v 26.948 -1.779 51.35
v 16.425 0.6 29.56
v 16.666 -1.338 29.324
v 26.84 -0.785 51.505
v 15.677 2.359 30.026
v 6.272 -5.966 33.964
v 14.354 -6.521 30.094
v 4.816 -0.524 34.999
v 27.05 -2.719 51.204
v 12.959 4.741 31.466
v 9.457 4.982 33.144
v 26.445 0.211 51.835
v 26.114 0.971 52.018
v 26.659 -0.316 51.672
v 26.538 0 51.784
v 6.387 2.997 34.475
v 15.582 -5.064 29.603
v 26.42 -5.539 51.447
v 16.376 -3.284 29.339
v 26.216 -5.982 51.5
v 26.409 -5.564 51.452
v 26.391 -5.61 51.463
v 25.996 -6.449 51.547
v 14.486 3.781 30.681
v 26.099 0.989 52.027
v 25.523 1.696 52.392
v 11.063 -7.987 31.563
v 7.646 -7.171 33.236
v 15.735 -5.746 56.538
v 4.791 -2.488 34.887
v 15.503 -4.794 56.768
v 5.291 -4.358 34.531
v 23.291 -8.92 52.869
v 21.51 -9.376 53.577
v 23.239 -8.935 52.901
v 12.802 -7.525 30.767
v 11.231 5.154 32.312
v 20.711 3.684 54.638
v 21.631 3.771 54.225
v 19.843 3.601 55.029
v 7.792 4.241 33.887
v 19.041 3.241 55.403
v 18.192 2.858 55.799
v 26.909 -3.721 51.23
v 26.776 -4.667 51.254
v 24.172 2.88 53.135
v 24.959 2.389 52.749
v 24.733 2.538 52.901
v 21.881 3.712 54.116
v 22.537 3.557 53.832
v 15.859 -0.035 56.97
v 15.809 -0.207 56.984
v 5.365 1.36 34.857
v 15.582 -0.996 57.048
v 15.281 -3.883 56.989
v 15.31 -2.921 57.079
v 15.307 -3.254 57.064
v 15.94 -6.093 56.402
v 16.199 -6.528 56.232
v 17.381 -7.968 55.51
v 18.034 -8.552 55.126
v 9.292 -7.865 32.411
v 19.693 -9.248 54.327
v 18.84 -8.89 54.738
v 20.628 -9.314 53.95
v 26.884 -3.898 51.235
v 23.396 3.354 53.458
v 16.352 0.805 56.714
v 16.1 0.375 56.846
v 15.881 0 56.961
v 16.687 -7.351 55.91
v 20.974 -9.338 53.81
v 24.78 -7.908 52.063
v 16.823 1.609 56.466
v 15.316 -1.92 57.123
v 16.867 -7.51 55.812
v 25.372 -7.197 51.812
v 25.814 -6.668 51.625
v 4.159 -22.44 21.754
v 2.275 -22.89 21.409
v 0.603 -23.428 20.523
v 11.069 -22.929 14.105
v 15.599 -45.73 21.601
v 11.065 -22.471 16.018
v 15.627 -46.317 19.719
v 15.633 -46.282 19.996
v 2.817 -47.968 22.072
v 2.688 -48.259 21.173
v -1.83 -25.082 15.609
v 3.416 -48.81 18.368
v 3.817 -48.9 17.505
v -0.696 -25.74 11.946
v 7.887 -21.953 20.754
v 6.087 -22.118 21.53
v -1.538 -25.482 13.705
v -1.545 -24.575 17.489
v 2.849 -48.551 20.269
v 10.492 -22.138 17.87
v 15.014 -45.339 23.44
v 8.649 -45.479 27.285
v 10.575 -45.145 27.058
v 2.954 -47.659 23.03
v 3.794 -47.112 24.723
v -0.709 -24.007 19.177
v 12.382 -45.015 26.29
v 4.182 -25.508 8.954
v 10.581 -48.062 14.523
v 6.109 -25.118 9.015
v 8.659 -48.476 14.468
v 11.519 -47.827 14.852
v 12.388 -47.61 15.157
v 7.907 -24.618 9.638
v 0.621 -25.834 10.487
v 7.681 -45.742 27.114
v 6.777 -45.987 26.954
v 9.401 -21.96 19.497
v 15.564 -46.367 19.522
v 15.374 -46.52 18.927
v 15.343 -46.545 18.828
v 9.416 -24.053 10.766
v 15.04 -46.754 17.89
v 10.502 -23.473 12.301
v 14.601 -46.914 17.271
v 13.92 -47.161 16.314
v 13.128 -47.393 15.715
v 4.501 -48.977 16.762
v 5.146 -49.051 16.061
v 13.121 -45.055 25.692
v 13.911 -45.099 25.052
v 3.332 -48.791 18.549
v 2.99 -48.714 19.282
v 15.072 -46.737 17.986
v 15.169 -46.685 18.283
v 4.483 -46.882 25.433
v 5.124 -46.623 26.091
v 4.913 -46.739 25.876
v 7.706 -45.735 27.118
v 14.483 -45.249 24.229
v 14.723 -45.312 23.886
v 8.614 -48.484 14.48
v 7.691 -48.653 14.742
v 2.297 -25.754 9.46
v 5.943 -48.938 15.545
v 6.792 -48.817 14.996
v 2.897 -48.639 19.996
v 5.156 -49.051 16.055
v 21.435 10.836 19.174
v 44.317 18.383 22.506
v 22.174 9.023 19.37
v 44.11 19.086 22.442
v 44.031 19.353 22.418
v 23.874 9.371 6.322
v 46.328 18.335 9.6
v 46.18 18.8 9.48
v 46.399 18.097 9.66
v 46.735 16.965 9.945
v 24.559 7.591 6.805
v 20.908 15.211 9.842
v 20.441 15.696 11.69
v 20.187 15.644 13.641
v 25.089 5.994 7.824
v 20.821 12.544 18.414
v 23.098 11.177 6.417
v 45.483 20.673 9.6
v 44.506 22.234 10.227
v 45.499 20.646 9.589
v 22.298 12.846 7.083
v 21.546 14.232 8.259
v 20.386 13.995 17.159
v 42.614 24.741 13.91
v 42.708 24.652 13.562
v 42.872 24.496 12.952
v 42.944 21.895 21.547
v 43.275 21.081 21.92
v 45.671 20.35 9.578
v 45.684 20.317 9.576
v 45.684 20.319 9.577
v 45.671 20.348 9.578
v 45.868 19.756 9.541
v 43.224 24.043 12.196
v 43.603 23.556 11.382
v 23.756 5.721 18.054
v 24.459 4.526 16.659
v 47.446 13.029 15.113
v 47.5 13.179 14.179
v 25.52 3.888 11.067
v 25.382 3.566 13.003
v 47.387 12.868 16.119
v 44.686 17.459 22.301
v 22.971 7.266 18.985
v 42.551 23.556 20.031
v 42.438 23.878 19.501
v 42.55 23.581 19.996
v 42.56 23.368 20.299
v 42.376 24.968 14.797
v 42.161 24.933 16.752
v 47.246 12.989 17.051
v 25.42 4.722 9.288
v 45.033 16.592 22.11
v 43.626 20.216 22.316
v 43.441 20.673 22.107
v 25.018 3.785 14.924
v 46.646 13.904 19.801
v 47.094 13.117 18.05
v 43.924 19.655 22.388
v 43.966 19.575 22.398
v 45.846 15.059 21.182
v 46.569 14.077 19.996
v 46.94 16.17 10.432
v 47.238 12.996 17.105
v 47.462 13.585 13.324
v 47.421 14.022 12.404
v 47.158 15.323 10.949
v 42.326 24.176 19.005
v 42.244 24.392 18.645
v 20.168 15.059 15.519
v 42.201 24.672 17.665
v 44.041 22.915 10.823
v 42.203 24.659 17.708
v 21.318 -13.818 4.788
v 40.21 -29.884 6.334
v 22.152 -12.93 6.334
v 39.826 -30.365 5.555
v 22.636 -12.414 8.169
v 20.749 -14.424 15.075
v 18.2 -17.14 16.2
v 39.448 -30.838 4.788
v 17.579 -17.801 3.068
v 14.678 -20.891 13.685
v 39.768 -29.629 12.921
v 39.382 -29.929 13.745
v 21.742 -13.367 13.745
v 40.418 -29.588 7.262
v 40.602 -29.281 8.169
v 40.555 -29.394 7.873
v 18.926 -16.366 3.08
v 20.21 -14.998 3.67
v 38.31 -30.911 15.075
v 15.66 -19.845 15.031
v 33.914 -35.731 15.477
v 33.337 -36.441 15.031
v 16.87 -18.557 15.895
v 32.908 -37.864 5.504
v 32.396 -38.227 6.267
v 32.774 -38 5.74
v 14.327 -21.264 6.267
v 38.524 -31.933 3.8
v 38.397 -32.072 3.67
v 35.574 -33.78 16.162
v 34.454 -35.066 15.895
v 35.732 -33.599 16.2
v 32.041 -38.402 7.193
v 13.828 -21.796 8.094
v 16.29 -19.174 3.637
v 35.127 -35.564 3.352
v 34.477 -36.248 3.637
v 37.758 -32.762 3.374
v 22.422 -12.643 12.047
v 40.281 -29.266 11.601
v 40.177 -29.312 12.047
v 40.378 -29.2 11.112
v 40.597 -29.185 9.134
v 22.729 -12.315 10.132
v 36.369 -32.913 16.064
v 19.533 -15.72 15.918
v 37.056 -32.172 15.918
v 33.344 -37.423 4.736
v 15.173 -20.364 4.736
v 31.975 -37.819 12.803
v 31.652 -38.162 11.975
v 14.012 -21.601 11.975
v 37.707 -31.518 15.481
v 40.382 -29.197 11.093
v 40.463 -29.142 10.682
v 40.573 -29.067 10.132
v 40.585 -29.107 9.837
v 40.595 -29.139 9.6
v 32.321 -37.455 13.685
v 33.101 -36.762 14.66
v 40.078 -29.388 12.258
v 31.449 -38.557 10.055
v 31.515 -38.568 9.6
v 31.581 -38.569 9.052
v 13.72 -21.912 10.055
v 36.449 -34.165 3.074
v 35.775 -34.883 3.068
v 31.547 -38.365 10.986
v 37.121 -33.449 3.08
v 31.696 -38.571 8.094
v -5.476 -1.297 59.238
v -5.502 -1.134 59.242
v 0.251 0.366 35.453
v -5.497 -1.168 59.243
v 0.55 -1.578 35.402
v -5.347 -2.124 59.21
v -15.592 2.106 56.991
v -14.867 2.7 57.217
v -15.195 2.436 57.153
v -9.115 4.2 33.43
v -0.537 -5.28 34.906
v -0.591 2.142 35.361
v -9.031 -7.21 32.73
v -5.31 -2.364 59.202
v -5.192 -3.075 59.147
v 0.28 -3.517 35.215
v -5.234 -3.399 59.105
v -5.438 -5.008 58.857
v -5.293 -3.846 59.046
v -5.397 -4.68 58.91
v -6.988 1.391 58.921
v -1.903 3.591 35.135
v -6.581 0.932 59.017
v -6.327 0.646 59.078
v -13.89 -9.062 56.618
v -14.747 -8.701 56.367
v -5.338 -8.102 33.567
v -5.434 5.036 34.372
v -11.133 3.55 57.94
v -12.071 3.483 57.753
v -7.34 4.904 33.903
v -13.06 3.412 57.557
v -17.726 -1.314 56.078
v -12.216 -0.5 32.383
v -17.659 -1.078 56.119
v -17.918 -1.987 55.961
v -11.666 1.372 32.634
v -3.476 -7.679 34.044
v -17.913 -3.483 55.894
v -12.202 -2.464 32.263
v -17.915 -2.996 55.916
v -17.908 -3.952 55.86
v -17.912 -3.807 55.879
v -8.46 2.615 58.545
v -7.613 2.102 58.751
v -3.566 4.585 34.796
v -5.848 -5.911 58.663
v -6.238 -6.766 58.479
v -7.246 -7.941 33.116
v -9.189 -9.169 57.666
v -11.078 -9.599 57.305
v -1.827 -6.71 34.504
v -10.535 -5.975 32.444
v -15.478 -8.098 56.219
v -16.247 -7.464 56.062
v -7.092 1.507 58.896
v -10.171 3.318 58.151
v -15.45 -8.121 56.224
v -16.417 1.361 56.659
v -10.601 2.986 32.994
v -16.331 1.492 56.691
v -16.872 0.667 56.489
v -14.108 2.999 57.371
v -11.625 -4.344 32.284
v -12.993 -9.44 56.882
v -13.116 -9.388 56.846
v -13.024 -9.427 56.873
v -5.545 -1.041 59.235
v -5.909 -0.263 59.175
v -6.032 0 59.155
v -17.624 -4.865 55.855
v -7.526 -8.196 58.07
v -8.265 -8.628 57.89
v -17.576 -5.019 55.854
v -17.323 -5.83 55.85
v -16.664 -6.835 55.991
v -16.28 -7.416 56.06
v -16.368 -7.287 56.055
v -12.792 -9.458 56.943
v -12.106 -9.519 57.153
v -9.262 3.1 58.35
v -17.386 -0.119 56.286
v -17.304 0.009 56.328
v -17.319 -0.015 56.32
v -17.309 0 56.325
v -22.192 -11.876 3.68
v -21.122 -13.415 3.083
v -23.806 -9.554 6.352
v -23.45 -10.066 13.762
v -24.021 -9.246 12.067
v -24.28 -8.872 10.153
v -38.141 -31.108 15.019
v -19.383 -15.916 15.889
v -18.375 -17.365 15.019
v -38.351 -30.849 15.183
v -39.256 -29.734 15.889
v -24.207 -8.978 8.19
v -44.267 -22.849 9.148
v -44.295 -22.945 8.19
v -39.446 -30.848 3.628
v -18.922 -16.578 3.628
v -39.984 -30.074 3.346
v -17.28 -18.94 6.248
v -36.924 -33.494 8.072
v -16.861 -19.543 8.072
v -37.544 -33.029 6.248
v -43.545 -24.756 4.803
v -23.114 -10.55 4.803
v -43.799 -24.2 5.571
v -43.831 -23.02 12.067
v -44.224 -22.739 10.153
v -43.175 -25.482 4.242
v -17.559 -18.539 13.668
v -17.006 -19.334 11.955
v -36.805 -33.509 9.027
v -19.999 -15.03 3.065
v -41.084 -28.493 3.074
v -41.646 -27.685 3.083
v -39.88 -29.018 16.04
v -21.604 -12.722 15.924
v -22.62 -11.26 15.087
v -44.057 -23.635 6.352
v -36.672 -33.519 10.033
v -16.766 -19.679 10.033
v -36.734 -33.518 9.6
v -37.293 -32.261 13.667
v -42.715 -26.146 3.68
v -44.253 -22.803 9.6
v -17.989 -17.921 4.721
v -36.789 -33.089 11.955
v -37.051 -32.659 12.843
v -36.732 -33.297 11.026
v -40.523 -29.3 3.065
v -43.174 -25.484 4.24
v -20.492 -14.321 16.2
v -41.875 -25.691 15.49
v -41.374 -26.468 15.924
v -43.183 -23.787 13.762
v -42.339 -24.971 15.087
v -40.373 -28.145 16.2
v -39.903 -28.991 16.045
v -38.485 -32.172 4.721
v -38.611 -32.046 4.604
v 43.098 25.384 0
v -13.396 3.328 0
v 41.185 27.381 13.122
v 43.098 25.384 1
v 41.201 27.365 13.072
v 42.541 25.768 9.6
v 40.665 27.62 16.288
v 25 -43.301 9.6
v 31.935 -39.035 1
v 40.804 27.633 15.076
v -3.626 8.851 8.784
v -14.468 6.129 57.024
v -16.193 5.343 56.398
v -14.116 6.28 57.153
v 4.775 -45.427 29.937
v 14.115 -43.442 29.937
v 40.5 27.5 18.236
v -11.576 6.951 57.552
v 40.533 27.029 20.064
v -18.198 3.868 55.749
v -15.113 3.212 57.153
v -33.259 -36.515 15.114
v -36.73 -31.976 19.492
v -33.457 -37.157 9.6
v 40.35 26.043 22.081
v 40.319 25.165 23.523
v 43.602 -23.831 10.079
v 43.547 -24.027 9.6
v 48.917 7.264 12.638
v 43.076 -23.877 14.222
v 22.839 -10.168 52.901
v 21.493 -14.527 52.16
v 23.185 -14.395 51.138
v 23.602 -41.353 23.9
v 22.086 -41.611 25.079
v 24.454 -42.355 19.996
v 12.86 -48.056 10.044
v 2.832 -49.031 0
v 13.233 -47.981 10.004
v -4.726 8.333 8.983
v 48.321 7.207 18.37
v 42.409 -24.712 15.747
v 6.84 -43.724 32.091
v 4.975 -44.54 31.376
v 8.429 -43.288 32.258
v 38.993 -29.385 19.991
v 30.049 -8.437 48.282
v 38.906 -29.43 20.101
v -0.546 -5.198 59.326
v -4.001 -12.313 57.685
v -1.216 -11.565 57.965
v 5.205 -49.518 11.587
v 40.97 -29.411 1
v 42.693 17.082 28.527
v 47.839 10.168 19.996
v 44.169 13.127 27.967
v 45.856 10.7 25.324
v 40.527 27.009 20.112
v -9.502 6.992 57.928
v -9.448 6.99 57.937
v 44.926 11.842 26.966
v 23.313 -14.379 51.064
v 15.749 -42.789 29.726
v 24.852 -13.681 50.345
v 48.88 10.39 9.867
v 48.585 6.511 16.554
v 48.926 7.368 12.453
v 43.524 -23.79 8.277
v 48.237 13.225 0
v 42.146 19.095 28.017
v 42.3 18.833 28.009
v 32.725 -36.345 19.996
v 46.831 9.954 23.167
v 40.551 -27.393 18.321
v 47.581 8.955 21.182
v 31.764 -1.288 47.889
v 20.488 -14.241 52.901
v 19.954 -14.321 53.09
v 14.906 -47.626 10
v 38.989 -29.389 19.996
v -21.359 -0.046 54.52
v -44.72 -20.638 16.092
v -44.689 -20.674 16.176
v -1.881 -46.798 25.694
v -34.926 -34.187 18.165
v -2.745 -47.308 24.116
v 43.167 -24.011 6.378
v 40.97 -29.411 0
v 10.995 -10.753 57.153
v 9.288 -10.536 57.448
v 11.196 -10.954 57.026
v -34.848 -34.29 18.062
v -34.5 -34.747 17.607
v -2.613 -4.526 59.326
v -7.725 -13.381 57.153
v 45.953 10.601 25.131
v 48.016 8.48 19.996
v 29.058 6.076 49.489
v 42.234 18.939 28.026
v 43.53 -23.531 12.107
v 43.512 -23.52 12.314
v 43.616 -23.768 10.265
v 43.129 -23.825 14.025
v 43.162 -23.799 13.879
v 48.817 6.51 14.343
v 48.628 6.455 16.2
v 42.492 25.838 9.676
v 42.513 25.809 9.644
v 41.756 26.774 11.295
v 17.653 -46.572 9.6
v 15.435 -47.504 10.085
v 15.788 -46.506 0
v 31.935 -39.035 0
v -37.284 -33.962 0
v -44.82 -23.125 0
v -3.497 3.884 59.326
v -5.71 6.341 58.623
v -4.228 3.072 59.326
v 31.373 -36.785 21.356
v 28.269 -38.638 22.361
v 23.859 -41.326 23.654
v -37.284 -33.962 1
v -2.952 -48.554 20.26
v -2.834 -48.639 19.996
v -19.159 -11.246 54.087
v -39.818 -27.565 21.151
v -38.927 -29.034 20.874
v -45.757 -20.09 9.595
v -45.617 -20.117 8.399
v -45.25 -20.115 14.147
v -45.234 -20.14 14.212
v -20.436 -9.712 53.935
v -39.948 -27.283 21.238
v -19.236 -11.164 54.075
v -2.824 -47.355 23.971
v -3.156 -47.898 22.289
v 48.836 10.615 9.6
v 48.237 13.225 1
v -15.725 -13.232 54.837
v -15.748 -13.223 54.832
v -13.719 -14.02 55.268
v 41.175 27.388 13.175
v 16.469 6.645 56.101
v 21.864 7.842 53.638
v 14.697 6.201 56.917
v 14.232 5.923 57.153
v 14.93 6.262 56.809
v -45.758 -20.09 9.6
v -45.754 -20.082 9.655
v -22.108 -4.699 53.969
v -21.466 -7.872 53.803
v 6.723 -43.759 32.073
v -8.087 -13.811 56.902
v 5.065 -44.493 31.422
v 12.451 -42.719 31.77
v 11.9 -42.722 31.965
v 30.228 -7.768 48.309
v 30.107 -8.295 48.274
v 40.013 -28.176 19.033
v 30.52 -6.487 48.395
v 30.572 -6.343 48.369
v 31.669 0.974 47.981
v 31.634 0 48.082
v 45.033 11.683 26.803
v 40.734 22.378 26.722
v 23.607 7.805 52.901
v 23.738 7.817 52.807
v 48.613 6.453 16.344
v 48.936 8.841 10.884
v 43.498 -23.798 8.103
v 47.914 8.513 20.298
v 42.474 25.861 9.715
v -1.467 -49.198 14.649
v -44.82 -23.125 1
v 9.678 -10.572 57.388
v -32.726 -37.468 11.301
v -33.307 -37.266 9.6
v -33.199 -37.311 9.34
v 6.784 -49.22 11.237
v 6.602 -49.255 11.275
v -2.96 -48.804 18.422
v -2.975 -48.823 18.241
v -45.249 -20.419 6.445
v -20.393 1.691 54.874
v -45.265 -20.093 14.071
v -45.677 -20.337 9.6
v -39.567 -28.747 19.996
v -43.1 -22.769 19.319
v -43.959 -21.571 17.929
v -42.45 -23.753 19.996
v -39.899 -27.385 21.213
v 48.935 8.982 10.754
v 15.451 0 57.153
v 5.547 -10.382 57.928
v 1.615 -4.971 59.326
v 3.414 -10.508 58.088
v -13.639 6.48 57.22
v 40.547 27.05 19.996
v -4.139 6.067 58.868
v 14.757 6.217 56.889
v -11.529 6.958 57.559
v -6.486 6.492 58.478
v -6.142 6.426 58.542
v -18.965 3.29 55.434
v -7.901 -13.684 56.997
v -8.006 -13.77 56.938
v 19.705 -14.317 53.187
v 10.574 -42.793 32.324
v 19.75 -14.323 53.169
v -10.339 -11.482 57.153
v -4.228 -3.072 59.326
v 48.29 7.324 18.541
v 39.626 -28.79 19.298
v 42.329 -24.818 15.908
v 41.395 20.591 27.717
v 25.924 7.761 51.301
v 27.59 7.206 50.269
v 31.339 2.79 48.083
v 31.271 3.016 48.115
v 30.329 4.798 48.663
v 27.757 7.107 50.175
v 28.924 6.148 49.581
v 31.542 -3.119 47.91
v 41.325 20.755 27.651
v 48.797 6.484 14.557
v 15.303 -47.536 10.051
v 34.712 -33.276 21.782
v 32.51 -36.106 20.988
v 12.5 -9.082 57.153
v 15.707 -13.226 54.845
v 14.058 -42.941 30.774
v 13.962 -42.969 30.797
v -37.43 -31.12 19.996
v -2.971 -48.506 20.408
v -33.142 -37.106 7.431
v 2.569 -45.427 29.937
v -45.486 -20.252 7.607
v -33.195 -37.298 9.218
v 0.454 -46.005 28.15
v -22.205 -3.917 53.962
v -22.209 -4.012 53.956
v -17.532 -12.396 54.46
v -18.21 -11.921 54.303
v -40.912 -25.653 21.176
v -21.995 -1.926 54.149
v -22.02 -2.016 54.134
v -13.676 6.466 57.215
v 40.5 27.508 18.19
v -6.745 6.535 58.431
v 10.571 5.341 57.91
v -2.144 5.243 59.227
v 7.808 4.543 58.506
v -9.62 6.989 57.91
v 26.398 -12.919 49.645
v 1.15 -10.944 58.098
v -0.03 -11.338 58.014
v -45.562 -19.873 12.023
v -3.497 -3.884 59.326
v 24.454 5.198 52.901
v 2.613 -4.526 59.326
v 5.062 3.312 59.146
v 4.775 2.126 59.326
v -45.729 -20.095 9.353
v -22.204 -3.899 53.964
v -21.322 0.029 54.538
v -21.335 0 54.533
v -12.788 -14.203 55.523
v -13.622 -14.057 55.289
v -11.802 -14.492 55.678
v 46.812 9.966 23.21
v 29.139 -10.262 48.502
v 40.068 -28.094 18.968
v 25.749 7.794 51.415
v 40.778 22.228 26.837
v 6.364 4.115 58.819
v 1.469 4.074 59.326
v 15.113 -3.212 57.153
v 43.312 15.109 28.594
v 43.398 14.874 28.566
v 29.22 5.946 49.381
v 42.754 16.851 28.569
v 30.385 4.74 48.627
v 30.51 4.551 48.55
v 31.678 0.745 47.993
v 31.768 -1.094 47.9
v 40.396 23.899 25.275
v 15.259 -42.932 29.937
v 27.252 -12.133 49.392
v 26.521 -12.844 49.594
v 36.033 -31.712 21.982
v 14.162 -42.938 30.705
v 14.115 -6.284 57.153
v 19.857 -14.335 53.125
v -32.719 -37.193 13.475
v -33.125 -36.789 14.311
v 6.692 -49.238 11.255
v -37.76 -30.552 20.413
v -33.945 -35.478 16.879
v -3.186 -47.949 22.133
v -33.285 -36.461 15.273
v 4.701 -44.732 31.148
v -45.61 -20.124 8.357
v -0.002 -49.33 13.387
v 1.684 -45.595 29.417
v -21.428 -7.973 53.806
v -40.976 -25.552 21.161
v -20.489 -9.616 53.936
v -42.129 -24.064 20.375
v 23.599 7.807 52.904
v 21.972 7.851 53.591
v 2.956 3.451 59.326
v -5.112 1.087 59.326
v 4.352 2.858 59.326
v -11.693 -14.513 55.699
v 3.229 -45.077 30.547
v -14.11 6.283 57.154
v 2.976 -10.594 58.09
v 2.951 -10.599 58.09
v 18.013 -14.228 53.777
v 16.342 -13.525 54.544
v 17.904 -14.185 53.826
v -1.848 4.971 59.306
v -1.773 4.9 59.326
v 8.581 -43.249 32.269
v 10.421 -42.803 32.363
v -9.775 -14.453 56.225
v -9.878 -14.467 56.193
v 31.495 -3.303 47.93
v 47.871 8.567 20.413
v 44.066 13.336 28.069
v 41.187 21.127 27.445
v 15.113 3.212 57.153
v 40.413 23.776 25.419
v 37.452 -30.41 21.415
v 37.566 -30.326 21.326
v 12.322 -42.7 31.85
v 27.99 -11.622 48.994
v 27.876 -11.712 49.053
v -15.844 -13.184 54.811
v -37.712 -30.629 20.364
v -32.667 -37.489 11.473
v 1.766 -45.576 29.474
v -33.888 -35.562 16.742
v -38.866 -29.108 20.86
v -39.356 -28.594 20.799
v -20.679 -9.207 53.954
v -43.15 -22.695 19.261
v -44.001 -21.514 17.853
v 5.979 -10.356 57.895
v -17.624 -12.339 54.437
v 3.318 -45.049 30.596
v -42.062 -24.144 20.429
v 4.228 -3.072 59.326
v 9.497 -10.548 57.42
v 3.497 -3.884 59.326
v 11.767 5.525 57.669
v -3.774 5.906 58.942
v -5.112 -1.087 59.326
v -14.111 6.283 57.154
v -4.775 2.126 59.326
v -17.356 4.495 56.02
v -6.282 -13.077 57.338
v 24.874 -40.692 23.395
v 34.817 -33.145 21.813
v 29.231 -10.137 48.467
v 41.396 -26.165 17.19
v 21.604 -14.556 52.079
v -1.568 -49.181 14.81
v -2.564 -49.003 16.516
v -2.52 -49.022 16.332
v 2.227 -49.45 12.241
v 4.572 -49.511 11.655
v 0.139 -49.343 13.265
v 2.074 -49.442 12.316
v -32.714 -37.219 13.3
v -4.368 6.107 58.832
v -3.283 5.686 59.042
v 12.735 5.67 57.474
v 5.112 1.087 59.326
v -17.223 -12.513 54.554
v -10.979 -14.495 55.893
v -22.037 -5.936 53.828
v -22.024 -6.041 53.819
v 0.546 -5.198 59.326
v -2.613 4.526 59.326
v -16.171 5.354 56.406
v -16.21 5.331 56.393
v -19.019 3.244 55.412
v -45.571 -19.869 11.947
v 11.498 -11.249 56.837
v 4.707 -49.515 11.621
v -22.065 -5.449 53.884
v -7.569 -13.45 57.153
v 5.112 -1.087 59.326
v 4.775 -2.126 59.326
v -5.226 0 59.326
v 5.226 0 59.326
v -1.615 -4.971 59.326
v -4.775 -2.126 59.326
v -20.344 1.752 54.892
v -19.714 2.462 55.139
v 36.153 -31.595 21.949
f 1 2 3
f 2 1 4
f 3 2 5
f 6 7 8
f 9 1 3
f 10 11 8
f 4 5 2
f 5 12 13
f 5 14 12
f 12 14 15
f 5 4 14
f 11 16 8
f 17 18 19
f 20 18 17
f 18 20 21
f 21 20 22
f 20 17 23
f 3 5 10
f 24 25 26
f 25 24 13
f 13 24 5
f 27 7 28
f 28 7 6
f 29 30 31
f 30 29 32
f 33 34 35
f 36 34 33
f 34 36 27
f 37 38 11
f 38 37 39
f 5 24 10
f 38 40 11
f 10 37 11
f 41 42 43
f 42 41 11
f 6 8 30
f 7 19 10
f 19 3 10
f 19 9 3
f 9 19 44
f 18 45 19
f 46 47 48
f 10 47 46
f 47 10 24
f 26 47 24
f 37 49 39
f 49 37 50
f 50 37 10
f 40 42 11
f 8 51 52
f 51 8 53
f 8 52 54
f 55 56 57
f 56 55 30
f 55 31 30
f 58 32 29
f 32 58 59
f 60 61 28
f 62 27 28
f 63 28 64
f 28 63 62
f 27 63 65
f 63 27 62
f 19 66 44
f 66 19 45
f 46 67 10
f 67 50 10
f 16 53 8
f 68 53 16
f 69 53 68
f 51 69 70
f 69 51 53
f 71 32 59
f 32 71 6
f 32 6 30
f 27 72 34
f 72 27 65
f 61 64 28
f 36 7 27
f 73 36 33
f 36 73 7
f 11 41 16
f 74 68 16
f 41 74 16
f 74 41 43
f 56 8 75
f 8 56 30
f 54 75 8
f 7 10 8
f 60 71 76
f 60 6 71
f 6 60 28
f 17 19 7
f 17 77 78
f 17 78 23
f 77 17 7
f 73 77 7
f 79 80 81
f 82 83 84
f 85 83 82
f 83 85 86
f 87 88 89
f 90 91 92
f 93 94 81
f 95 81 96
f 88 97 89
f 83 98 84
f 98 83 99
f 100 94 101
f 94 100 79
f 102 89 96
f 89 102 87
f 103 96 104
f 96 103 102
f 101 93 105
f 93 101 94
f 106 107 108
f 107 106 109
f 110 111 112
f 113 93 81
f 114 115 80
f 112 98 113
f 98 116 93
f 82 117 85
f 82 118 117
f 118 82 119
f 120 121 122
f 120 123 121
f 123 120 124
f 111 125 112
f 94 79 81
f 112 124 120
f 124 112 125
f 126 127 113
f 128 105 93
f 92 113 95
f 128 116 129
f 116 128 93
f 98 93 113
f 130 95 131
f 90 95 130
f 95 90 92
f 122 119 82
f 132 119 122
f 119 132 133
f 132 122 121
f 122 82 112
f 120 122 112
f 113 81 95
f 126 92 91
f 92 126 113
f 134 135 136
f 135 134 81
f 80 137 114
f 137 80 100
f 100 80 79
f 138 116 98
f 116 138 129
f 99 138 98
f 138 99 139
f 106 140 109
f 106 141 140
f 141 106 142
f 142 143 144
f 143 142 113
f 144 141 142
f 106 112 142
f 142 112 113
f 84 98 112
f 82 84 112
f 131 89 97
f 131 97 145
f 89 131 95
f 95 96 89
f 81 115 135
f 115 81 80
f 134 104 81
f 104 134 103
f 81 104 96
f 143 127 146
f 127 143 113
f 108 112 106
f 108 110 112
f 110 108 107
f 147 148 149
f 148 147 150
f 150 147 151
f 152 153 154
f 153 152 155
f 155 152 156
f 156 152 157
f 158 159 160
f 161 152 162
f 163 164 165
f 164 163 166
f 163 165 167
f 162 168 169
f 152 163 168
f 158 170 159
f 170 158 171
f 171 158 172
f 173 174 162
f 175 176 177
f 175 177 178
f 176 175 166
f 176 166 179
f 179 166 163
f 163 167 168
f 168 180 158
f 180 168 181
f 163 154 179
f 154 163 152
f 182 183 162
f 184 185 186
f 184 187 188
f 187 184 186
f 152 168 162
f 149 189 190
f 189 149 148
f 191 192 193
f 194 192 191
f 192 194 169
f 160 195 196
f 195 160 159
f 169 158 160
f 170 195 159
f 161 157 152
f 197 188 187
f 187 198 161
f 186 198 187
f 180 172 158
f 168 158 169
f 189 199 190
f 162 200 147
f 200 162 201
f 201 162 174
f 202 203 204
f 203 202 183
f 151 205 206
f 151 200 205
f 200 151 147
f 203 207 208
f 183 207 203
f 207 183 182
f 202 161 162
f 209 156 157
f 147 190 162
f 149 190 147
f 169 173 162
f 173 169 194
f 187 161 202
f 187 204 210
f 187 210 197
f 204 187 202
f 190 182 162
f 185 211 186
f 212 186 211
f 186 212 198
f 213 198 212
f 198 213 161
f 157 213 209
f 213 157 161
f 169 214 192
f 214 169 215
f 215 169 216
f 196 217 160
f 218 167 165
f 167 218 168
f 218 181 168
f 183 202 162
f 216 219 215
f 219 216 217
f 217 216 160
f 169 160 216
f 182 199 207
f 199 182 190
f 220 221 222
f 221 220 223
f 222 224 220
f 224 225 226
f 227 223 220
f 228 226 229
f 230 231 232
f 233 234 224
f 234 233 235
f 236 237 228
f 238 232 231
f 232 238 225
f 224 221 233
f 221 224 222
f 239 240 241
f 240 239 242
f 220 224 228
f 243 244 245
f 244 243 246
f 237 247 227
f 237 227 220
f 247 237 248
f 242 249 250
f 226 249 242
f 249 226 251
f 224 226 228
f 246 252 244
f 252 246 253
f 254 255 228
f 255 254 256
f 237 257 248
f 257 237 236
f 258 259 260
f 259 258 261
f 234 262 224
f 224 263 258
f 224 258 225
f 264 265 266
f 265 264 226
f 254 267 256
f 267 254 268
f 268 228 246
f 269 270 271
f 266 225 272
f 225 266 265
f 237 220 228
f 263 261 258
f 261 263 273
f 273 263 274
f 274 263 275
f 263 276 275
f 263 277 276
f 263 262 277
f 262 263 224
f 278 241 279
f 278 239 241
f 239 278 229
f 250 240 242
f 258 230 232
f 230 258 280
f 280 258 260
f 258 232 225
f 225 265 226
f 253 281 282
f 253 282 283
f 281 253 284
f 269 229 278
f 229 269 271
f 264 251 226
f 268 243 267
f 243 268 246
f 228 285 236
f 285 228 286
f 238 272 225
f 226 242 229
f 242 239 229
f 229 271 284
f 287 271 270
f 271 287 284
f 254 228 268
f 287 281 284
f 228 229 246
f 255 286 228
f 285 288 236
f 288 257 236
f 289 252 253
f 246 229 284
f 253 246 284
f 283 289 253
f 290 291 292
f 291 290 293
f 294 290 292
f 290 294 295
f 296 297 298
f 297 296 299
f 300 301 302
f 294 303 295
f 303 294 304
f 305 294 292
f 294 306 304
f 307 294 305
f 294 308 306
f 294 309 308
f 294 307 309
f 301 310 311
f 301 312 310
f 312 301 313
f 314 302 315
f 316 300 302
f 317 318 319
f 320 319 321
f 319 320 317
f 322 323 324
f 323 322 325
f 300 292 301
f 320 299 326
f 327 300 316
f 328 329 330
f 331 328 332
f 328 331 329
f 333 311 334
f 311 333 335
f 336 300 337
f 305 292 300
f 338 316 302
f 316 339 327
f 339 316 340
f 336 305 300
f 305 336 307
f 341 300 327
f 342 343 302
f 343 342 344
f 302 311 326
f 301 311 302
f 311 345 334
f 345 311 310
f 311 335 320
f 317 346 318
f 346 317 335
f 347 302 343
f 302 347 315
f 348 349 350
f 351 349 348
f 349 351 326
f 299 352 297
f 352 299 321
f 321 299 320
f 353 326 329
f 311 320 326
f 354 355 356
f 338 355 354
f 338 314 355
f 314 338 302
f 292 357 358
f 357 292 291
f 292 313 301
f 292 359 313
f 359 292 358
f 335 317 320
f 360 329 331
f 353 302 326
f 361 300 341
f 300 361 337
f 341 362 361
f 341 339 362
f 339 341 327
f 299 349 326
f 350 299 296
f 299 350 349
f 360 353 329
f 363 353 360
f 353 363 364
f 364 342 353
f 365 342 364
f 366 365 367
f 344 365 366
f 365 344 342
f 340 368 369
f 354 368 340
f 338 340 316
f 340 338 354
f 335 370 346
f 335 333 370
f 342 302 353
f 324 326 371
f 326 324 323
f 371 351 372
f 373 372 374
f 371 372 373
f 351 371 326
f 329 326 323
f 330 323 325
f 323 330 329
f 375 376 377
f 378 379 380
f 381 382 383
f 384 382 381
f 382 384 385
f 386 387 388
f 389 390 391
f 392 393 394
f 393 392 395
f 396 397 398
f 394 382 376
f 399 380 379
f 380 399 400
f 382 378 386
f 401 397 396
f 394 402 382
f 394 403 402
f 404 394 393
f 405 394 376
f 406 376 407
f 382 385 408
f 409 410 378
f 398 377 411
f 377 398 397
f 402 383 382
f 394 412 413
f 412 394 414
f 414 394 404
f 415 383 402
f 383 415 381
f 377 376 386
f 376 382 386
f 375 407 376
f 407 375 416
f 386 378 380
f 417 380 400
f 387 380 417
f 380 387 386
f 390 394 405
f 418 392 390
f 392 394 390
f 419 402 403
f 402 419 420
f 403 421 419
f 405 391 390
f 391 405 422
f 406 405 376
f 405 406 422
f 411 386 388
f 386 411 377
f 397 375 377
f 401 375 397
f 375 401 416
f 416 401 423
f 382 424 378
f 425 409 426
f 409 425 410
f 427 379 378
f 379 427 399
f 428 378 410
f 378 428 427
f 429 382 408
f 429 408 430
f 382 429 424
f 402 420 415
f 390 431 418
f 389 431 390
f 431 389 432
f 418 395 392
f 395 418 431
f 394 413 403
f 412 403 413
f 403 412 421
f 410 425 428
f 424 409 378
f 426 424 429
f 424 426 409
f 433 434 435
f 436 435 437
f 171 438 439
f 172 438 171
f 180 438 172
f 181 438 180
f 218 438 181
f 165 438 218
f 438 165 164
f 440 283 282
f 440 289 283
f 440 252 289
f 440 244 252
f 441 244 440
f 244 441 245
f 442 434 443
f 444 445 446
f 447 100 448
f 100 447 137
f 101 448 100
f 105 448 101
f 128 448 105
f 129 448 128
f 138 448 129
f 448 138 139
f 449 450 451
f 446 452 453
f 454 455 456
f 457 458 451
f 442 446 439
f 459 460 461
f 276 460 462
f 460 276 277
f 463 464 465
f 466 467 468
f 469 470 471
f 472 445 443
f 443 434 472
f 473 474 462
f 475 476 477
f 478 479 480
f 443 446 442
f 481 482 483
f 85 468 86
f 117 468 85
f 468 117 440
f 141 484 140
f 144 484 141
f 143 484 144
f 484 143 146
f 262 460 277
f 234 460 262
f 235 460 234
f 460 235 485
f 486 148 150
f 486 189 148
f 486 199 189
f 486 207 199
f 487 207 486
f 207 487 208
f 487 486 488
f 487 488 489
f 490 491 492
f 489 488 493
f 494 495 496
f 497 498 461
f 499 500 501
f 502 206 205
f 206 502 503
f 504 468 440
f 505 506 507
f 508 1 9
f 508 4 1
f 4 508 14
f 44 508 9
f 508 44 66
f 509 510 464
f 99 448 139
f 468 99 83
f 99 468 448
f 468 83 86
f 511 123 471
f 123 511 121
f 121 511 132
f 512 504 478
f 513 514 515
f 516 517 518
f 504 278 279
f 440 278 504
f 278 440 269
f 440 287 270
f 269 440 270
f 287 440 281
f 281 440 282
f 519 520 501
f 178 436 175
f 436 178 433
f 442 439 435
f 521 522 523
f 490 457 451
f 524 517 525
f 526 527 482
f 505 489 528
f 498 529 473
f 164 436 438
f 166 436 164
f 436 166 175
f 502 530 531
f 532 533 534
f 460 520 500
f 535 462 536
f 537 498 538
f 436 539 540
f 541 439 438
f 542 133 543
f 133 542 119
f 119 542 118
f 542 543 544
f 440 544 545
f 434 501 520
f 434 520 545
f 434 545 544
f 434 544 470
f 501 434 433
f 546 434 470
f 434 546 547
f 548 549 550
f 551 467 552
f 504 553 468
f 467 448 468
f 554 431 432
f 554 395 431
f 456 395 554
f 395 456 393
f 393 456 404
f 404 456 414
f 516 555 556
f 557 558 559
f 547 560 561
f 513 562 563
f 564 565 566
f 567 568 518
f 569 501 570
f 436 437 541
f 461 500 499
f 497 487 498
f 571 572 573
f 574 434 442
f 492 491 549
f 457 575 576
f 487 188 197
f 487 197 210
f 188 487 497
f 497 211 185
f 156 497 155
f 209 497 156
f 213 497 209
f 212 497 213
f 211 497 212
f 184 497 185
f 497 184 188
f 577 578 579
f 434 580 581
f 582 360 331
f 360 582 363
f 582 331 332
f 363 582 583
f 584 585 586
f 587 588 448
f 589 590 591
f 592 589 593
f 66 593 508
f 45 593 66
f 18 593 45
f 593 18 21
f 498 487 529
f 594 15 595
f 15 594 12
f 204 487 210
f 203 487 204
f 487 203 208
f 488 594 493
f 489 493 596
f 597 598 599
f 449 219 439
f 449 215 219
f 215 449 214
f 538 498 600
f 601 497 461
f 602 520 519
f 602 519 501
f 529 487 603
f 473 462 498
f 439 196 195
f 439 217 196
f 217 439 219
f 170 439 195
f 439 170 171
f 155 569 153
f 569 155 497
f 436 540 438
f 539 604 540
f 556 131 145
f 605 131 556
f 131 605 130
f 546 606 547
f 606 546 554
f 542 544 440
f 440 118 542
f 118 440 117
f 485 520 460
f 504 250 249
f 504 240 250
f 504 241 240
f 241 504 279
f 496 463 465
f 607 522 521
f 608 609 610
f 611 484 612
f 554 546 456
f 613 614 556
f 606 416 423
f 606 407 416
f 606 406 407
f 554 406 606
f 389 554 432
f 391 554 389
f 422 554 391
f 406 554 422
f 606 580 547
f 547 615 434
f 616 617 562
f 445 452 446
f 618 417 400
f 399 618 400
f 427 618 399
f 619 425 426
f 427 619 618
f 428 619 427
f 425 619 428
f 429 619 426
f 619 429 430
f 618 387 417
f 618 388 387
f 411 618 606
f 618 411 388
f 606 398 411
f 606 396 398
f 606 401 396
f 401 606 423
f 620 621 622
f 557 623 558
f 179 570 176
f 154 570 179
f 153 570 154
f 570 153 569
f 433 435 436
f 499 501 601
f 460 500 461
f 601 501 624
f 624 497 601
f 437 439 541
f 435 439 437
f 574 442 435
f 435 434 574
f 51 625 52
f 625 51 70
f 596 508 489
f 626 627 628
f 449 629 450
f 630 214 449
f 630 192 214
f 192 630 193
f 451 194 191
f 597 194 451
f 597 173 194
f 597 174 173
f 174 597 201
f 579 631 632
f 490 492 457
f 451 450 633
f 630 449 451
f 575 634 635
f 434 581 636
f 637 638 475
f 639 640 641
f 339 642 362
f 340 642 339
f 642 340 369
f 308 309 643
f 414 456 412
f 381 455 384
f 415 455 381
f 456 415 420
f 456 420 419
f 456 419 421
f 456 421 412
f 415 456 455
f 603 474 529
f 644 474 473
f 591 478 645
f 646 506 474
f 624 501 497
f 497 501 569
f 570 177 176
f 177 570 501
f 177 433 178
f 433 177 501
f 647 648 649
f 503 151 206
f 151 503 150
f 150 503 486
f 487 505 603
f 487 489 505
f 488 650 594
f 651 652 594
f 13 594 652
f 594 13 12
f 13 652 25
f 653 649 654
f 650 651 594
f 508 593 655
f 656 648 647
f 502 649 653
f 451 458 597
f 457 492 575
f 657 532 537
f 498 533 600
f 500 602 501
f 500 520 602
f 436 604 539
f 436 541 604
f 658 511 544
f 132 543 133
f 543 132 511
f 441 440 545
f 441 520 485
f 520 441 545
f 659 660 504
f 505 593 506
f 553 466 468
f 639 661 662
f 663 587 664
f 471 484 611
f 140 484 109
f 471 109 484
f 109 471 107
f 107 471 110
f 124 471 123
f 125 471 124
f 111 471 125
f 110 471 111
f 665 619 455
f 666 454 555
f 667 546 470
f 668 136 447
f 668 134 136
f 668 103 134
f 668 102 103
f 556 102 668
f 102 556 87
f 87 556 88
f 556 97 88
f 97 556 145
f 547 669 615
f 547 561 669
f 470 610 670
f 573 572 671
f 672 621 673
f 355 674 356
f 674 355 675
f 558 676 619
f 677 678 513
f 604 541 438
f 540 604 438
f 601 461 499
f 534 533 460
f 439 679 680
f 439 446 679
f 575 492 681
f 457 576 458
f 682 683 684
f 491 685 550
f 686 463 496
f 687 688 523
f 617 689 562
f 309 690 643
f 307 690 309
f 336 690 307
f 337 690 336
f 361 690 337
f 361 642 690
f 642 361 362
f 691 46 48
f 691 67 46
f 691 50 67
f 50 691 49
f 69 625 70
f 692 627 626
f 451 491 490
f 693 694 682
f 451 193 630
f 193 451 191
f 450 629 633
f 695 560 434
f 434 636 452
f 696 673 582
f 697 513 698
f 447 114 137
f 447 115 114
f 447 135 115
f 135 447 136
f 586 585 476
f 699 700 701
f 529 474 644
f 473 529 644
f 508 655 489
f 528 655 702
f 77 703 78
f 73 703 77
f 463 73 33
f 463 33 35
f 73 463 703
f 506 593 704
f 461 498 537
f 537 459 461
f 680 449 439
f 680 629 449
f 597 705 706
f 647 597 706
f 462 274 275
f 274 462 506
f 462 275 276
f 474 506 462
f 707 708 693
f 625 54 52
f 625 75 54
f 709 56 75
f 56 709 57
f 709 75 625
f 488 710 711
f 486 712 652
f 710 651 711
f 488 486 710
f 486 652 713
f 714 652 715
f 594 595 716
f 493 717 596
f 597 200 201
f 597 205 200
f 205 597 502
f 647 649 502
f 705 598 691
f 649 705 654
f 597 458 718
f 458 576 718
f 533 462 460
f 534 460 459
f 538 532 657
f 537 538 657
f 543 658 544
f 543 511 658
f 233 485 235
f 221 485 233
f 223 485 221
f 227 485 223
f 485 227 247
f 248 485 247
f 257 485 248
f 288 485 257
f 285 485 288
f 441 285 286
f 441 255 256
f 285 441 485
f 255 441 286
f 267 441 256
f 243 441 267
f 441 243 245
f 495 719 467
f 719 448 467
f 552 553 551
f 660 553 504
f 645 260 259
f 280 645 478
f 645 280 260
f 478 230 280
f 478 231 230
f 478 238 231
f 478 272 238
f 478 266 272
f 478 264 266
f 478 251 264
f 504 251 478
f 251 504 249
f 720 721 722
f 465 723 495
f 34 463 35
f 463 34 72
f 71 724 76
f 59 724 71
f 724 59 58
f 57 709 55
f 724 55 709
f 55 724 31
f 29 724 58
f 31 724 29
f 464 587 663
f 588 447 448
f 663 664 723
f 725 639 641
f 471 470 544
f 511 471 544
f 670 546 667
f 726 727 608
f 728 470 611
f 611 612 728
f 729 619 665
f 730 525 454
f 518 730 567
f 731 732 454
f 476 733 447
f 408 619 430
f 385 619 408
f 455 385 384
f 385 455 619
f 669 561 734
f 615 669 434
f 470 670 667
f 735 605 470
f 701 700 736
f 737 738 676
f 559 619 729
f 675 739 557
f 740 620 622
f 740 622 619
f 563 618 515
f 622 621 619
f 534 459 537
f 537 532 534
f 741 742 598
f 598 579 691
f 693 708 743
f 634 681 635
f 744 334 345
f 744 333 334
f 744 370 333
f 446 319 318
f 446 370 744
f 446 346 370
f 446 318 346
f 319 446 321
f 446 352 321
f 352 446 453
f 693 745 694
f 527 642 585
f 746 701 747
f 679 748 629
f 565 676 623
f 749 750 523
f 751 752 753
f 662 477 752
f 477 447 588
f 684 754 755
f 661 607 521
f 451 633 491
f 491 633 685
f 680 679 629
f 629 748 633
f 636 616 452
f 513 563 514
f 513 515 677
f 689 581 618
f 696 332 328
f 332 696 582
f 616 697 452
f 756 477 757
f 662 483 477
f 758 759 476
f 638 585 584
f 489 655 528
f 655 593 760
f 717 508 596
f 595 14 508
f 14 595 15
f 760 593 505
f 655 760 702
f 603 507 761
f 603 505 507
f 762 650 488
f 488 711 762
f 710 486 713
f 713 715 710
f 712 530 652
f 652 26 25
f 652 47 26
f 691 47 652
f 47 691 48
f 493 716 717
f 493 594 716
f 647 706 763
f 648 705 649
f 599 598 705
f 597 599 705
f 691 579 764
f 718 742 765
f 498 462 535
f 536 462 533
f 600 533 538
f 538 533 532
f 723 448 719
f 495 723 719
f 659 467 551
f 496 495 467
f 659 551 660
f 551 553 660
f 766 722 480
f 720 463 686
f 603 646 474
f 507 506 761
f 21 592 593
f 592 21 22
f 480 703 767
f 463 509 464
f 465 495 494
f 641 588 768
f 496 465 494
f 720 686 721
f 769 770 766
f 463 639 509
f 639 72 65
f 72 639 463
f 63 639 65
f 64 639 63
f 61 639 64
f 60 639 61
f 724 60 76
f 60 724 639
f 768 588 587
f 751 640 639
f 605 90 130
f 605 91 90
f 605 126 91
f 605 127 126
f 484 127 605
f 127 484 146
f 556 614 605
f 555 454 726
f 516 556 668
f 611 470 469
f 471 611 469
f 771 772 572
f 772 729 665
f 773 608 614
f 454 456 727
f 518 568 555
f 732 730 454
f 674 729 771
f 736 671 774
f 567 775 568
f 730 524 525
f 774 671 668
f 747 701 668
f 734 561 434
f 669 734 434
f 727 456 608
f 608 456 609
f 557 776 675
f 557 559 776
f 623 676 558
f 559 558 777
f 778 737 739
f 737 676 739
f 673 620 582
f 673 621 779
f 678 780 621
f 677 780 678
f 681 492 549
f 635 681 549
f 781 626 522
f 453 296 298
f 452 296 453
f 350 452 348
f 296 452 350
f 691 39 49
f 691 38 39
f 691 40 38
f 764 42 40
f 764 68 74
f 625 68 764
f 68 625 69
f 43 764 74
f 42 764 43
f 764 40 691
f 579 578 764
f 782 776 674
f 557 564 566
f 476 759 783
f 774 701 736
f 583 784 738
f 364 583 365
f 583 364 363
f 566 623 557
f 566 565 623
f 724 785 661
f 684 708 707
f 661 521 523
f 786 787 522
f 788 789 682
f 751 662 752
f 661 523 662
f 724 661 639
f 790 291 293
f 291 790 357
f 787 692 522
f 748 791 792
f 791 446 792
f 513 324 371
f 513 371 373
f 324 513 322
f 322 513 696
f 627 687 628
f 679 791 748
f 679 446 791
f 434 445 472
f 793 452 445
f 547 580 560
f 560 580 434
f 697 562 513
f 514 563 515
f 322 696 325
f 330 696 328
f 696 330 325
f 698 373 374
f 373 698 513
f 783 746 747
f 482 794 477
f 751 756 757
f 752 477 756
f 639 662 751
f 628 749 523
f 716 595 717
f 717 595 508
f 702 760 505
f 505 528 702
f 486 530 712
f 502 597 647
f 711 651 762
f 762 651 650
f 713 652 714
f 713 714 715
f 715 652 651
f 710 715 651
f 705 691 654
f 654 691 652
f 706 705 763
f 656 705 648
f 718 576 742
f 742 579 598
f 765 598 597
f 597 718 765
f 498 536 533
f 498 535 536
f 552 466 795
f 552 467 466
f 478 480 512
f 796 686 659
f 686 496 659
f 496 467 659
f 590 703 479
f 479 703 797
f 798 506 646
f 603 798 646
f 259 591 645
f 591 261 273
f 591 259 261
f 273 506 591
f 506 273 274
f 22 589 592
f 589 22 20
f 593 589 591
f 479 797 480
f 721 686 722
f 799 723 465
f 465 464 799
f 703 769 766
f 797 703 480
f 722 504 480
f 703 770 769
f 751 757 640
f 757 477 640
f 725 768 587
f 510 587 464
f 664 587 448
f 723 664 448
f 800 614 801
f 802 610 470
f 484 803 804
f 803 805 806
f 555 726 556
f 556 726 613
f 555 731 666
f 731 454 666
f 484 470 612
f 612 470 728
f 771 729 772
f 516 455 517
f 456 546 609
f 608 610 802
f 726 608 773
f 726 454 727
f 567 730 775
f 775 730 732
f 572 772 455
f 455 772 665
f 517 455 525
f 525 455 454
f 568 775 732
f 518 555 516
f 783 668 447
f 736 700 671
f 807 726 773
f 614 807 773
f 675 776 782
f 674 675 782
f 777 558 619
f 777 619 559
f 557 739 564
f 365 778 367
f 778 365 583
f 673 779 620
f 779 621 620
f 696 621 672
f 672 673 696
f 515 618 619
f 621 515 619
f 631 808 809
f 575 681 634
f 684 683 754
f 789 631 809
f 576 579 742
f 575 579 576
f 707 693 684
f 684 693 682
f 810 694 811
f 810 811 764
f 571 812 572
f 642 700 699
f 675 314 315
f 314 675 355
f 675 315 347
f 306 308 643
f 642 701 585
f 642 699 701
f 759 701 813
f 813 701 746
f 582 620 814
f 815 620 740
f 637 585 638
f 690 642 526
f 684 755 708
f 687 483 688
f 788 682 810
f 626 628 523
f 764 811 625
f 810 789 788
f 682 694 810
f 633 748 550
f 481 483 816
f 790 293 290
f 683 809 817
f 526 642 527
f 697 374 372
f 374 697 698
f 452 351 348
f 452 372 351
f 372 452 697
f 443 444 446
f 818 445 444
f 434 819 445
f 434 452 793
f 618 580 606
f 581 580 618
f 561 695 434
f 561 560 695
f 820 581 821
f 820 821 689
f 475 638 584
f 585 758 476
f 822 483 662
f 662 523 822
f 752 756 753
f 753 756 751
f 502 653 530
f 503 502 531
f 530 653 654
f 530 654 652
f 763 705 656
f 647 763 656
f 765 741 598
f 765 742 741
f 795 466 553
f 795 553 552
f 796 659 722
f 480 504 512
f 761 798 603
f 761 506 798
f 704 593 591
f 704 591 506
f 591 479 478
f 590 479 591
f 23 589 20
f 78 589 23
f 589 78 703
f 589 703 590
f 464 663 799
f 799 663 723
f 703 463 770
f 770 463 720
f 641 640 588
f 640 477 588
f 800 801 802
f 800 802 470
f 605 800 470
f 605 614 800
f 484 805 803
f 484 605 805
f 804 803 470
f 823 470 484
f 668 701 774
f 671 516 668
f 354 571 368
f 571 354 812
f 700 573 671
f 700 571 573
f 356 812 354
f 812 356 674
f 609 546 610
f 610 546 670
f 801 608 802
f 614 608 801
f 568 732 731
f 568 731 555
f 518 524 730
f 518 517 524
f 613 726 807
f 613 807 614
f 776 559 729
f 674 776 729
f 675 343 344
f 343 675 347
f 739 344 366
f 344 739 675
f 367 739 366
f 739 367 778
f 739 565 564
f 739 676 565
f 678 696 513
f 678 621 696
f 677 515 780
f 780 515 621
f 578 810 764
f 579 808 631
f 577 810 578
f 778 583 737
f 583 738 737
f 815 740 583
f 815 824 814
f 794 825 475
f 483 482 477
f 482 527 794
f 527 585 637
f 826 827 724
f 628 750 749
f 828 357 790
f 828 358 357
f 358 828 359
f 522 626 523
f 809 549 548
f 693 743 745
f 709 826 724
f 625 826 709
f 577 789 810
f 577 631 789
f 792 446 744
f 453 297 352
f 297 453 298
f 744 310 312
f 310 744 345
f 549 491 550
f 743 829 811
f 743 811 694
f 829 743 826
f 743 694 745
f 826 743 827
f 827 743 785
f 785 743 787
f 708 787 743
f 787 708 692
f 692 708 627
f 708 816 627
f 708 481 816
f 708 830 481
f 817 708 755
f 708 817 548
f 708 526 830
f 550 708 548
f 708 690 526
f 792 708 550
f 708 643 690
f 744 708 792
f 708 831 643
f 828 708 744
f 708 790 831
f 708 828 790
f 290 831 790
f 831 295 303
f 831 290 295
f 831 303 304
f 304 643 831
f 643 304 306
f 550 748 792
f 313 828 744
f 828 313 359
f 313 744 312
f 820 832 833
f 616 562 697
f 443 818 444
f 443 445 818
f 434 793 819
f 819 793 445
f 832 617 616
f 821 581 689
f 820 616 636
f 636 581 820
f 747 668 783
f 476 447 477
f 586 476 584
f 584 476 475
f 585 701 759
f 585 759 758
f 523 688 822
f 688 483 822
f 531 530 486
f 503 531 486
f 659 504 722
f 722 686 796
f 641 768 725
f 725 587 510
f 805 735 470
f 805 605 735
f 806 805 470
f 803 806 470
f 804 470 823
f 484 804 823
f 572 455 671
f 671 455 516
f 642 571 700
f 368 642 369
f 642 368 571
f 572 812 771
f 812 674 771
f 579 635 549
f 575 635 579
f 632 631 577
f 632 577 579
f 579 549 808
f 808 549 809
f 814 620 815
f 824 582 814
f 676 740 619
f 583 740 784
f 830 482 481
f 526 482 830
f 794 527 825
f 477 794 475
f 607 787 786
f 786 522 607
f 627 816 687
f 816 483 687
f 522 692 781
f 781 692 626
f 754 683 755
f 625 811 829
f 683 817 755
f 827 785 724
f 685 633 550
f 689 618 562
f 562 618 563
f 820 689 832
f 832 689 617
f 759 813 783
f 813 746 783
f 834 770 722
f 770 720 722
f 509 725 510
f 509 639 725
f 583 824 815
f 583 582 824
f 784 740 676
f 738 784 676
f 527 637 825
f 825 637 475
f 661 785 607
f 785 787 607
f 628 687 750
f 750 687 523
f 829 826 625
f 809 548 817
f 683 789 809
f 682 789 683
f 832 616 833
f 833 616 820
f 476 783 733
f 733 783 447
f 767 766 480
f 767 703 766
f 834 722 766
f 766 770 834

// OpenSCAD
difference() {
	hull() {
		union() {
			union() {
				rotate(a = -7.5729583416, v = [0, 0, 1]) {
					translate(v = [0, -6.6000000000, 0]) {
						cube(size = [21.5910819668, 13.2000000000, 1]);
					}
				}
				rotate(a = -78.9712377941, v = [0, 0, 1]) {
					translate(v = [0, -6.6000000000, 0]) {
						cube(size = [48.6672465232, 13.2000000000, 1]);
					}
				}
				rotate(a = 22.9144796749, v = [0, 0, 1]) {
					translate(v = [0, -6.6000000000, 0]) {
						cube(size = [49.5800656167, 13.2000000000, 1]);
					}
				}
				rotate(a = -43.1928547717, v = [0, 0, 1]) {
					translate(v = [0, -6.6000000000, 0]) {
						cube(size = [50.0000000000, 13.2000000000, 1]);
					}
				}
				rotate(a = -165.3847464562, v = [0, 0, 1]) {
					translate(v = [0, -6.6000000000, 0]) {
						cube(size = [12.1224936359, 13.2000000000, 1]);
					}
				}
				rotate(a = -145.1891744331, v = [0, 0, 1]) {
					translate(v = [0, -6.6000000000, 0]) {
						cube(size = [50.0000000000, 13.2000000000, 1]);
					}
				}
			}
			translate(v = [0, 0, 9.6000000000]) {
				intersection() {
					hull() {
						rotate(a = 25.5831723663, v = [0.0569100521, 0.4280543244, -0.0000004850]) {
							cylinder(h = 50, r = 9.6000000000);
						}
						rotate(a = 76.7414666516, v = [0.9553687195, 0.1862023528, -0.0000011416]) {
							cylinder(h = 50, r = 9.6000000000);
						}
						rotate(a = 82.5689161548, v = [-0.3860865229, 0.9133509858, -0.0000005273]) {
							cylinder(h = 50, r = 9.6000000000);
						}
						rotate(a = 89.9999971892, v = [0.6844561926, 0.7290539901, -0.0000014135]) {
							cylinder(h = 50, r = 9.6000000000);
						}
						rotate(a = 14.0312489648, v = [0.0611776137, -0.2346056570, 0.0000001734]) {
							cylinder(h = 50, r = 9.6000000000);
						}
						rotate(a = 90.0000877256, v = [0.5708687069, -0.8210413628, 0.0000002502]) {
							cylinder(h = 50, r = 9.6000000000);
						}
					}
					sphere(r = 50);
				}
			}
		}
	}
	translate(v = [0, 0, 9.6000000000]) {
		rotate(a = 25.5831723663, v = [0.0569100521, 0.4280543244, -0.0000004850]) {
			translate(v = [0, 0, 25]) {
				cylinder(h = 50, r = 6.6000000000);
			}
		}
		rotate(a = 76.7414666516, v = [0.9553687195, 0.1862023528, -0.0000011416]) {
			translate(v = [0, 0, 25]) {
				cylinder(h = 50, r = 6.6000000000);
			}
		}
		rotate(a = 82.5689161548, v = [-0.3860865229, 0.9133509858, -0.0000005273]) {
			translate(v = [0, 0, 25]) {
				cylinder(h = 50, r = 6.6000000000);
			}
		}
		rotate(a = 89.9999971892, v = [0.6844561926, 0.7290539901, -0.0000014135]) {
			translate(v = [0, 0, 25]) {
				cylinder(h = 50, r = 6.6000000000);
			}
		}
		rotate(a = 14.0312489648, v = [0.0611776137, -0.2346056570, 0.0000001734]) {
			translate(v = [0, 0, 25]) {
				cylinder(h = 50, r = 6.6000000000);
			}
		}
		rotate(a = 90.0000877256, v = [0.5708687069, -0.8210413628, 0.0000002502]) {
			translate(v = [0, 0, 25]) {
				cylinder(h = 50, r = 6.6000000000);
			}
		}
	}
}
